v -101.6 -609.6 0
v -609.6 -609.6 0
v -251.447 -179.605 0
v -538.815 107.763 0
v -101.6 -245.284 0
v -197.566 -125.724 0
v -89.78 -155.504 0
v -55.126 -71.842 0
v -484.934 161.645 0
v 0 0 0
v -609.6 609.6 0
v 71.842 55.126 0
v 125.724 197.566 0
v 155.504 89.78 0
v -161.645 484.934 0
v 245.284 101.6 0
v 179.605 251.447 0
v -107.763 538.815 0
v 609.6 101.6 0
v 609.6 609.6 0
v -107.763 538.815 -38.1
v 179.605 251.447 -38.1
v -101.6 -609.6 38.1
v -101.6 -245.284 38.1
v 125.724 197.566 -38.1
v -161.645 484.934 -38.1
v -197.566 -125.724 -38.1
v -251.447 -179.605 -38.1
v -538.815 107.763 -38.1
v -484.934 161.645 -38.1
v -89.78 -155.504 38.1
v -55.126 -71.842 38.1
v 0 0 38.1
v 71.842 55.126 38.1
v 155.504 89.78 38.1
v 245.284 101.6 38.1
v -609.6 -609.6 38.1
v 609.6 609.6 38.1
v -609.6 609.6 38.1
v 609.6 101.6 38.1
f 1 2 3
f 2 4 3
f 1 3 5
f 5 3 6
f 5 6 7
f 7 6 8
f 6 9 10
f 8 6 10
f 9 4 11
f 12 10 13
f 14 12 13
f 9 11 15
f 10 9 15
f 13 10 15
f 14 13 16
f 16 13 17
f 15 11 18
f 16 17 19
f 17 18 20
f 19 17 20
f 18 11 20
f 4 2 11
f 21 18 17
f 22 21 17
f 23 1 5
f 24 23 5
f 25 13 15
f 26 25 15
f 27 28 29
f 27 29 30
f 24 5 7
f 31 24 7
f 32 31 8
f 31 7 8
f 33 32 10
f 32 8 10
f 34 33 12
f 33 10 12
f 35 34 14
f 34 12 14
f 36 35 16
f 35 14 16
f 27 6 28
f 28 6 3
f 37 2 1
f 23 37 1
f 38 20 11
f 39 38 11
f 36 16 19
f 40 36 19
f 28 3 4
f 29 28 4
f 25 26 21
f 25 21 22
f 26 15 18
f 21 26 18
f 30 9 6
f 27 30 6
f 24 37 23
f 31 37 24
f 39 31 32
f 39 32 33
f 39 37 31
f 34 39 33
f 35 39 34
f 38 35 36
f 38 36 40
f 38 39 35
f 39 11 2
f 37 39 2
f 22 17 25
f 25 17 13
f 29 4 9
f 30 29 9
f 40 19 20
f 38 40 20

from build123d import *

# Parameters (mm, degrees)
F1_DEPTH = 38.1
F3_DEPTH = 38.1


with BuildPart() as f1:
    # F0 (on Top) → F1 (new body)
    with BuildSketch(Plane.XY):
        with BuildLine():
            Line((609.6, 101.6), (609.6, 609.6))
            Line((609.6, 609.6), (-609.6, 609.6))
            Line((-609.6, 609.6), (-609.6, -609.6))
            Line((-609.6, -609.6), (-101.6, -609.6))
            Line((-101.6, -609.6), (-101.6, -245.284098))
            ThreePointArc((-101.6, -245.284098), (0, 0), (245.284098, 101.6))
            Line((245.284098, 101.6), (609.6, 101.6))
        make_face()
    extrude(amount=F1_DEPTH)

    # F2 (on face) → F3 (join)
    with BuildSketch(Plane(origin=(0, 0, 0), x_dir=(1, 0, 0), z_dir=(0, 0, -1))):
        Polygon((-197.565635, 125.723586), (-251.447171, 179.605122), (-538.815367, -107.763073), (-484.933831, -161.64461), align=None)
        Polygon((-161.64461, -484.933831), (-107.763073, -538.815367), (179.605122, -251.447171), (125.723586, -197.565635), align=None)
    extrude(amount=F3_DEPTH)


solid = f1.part
